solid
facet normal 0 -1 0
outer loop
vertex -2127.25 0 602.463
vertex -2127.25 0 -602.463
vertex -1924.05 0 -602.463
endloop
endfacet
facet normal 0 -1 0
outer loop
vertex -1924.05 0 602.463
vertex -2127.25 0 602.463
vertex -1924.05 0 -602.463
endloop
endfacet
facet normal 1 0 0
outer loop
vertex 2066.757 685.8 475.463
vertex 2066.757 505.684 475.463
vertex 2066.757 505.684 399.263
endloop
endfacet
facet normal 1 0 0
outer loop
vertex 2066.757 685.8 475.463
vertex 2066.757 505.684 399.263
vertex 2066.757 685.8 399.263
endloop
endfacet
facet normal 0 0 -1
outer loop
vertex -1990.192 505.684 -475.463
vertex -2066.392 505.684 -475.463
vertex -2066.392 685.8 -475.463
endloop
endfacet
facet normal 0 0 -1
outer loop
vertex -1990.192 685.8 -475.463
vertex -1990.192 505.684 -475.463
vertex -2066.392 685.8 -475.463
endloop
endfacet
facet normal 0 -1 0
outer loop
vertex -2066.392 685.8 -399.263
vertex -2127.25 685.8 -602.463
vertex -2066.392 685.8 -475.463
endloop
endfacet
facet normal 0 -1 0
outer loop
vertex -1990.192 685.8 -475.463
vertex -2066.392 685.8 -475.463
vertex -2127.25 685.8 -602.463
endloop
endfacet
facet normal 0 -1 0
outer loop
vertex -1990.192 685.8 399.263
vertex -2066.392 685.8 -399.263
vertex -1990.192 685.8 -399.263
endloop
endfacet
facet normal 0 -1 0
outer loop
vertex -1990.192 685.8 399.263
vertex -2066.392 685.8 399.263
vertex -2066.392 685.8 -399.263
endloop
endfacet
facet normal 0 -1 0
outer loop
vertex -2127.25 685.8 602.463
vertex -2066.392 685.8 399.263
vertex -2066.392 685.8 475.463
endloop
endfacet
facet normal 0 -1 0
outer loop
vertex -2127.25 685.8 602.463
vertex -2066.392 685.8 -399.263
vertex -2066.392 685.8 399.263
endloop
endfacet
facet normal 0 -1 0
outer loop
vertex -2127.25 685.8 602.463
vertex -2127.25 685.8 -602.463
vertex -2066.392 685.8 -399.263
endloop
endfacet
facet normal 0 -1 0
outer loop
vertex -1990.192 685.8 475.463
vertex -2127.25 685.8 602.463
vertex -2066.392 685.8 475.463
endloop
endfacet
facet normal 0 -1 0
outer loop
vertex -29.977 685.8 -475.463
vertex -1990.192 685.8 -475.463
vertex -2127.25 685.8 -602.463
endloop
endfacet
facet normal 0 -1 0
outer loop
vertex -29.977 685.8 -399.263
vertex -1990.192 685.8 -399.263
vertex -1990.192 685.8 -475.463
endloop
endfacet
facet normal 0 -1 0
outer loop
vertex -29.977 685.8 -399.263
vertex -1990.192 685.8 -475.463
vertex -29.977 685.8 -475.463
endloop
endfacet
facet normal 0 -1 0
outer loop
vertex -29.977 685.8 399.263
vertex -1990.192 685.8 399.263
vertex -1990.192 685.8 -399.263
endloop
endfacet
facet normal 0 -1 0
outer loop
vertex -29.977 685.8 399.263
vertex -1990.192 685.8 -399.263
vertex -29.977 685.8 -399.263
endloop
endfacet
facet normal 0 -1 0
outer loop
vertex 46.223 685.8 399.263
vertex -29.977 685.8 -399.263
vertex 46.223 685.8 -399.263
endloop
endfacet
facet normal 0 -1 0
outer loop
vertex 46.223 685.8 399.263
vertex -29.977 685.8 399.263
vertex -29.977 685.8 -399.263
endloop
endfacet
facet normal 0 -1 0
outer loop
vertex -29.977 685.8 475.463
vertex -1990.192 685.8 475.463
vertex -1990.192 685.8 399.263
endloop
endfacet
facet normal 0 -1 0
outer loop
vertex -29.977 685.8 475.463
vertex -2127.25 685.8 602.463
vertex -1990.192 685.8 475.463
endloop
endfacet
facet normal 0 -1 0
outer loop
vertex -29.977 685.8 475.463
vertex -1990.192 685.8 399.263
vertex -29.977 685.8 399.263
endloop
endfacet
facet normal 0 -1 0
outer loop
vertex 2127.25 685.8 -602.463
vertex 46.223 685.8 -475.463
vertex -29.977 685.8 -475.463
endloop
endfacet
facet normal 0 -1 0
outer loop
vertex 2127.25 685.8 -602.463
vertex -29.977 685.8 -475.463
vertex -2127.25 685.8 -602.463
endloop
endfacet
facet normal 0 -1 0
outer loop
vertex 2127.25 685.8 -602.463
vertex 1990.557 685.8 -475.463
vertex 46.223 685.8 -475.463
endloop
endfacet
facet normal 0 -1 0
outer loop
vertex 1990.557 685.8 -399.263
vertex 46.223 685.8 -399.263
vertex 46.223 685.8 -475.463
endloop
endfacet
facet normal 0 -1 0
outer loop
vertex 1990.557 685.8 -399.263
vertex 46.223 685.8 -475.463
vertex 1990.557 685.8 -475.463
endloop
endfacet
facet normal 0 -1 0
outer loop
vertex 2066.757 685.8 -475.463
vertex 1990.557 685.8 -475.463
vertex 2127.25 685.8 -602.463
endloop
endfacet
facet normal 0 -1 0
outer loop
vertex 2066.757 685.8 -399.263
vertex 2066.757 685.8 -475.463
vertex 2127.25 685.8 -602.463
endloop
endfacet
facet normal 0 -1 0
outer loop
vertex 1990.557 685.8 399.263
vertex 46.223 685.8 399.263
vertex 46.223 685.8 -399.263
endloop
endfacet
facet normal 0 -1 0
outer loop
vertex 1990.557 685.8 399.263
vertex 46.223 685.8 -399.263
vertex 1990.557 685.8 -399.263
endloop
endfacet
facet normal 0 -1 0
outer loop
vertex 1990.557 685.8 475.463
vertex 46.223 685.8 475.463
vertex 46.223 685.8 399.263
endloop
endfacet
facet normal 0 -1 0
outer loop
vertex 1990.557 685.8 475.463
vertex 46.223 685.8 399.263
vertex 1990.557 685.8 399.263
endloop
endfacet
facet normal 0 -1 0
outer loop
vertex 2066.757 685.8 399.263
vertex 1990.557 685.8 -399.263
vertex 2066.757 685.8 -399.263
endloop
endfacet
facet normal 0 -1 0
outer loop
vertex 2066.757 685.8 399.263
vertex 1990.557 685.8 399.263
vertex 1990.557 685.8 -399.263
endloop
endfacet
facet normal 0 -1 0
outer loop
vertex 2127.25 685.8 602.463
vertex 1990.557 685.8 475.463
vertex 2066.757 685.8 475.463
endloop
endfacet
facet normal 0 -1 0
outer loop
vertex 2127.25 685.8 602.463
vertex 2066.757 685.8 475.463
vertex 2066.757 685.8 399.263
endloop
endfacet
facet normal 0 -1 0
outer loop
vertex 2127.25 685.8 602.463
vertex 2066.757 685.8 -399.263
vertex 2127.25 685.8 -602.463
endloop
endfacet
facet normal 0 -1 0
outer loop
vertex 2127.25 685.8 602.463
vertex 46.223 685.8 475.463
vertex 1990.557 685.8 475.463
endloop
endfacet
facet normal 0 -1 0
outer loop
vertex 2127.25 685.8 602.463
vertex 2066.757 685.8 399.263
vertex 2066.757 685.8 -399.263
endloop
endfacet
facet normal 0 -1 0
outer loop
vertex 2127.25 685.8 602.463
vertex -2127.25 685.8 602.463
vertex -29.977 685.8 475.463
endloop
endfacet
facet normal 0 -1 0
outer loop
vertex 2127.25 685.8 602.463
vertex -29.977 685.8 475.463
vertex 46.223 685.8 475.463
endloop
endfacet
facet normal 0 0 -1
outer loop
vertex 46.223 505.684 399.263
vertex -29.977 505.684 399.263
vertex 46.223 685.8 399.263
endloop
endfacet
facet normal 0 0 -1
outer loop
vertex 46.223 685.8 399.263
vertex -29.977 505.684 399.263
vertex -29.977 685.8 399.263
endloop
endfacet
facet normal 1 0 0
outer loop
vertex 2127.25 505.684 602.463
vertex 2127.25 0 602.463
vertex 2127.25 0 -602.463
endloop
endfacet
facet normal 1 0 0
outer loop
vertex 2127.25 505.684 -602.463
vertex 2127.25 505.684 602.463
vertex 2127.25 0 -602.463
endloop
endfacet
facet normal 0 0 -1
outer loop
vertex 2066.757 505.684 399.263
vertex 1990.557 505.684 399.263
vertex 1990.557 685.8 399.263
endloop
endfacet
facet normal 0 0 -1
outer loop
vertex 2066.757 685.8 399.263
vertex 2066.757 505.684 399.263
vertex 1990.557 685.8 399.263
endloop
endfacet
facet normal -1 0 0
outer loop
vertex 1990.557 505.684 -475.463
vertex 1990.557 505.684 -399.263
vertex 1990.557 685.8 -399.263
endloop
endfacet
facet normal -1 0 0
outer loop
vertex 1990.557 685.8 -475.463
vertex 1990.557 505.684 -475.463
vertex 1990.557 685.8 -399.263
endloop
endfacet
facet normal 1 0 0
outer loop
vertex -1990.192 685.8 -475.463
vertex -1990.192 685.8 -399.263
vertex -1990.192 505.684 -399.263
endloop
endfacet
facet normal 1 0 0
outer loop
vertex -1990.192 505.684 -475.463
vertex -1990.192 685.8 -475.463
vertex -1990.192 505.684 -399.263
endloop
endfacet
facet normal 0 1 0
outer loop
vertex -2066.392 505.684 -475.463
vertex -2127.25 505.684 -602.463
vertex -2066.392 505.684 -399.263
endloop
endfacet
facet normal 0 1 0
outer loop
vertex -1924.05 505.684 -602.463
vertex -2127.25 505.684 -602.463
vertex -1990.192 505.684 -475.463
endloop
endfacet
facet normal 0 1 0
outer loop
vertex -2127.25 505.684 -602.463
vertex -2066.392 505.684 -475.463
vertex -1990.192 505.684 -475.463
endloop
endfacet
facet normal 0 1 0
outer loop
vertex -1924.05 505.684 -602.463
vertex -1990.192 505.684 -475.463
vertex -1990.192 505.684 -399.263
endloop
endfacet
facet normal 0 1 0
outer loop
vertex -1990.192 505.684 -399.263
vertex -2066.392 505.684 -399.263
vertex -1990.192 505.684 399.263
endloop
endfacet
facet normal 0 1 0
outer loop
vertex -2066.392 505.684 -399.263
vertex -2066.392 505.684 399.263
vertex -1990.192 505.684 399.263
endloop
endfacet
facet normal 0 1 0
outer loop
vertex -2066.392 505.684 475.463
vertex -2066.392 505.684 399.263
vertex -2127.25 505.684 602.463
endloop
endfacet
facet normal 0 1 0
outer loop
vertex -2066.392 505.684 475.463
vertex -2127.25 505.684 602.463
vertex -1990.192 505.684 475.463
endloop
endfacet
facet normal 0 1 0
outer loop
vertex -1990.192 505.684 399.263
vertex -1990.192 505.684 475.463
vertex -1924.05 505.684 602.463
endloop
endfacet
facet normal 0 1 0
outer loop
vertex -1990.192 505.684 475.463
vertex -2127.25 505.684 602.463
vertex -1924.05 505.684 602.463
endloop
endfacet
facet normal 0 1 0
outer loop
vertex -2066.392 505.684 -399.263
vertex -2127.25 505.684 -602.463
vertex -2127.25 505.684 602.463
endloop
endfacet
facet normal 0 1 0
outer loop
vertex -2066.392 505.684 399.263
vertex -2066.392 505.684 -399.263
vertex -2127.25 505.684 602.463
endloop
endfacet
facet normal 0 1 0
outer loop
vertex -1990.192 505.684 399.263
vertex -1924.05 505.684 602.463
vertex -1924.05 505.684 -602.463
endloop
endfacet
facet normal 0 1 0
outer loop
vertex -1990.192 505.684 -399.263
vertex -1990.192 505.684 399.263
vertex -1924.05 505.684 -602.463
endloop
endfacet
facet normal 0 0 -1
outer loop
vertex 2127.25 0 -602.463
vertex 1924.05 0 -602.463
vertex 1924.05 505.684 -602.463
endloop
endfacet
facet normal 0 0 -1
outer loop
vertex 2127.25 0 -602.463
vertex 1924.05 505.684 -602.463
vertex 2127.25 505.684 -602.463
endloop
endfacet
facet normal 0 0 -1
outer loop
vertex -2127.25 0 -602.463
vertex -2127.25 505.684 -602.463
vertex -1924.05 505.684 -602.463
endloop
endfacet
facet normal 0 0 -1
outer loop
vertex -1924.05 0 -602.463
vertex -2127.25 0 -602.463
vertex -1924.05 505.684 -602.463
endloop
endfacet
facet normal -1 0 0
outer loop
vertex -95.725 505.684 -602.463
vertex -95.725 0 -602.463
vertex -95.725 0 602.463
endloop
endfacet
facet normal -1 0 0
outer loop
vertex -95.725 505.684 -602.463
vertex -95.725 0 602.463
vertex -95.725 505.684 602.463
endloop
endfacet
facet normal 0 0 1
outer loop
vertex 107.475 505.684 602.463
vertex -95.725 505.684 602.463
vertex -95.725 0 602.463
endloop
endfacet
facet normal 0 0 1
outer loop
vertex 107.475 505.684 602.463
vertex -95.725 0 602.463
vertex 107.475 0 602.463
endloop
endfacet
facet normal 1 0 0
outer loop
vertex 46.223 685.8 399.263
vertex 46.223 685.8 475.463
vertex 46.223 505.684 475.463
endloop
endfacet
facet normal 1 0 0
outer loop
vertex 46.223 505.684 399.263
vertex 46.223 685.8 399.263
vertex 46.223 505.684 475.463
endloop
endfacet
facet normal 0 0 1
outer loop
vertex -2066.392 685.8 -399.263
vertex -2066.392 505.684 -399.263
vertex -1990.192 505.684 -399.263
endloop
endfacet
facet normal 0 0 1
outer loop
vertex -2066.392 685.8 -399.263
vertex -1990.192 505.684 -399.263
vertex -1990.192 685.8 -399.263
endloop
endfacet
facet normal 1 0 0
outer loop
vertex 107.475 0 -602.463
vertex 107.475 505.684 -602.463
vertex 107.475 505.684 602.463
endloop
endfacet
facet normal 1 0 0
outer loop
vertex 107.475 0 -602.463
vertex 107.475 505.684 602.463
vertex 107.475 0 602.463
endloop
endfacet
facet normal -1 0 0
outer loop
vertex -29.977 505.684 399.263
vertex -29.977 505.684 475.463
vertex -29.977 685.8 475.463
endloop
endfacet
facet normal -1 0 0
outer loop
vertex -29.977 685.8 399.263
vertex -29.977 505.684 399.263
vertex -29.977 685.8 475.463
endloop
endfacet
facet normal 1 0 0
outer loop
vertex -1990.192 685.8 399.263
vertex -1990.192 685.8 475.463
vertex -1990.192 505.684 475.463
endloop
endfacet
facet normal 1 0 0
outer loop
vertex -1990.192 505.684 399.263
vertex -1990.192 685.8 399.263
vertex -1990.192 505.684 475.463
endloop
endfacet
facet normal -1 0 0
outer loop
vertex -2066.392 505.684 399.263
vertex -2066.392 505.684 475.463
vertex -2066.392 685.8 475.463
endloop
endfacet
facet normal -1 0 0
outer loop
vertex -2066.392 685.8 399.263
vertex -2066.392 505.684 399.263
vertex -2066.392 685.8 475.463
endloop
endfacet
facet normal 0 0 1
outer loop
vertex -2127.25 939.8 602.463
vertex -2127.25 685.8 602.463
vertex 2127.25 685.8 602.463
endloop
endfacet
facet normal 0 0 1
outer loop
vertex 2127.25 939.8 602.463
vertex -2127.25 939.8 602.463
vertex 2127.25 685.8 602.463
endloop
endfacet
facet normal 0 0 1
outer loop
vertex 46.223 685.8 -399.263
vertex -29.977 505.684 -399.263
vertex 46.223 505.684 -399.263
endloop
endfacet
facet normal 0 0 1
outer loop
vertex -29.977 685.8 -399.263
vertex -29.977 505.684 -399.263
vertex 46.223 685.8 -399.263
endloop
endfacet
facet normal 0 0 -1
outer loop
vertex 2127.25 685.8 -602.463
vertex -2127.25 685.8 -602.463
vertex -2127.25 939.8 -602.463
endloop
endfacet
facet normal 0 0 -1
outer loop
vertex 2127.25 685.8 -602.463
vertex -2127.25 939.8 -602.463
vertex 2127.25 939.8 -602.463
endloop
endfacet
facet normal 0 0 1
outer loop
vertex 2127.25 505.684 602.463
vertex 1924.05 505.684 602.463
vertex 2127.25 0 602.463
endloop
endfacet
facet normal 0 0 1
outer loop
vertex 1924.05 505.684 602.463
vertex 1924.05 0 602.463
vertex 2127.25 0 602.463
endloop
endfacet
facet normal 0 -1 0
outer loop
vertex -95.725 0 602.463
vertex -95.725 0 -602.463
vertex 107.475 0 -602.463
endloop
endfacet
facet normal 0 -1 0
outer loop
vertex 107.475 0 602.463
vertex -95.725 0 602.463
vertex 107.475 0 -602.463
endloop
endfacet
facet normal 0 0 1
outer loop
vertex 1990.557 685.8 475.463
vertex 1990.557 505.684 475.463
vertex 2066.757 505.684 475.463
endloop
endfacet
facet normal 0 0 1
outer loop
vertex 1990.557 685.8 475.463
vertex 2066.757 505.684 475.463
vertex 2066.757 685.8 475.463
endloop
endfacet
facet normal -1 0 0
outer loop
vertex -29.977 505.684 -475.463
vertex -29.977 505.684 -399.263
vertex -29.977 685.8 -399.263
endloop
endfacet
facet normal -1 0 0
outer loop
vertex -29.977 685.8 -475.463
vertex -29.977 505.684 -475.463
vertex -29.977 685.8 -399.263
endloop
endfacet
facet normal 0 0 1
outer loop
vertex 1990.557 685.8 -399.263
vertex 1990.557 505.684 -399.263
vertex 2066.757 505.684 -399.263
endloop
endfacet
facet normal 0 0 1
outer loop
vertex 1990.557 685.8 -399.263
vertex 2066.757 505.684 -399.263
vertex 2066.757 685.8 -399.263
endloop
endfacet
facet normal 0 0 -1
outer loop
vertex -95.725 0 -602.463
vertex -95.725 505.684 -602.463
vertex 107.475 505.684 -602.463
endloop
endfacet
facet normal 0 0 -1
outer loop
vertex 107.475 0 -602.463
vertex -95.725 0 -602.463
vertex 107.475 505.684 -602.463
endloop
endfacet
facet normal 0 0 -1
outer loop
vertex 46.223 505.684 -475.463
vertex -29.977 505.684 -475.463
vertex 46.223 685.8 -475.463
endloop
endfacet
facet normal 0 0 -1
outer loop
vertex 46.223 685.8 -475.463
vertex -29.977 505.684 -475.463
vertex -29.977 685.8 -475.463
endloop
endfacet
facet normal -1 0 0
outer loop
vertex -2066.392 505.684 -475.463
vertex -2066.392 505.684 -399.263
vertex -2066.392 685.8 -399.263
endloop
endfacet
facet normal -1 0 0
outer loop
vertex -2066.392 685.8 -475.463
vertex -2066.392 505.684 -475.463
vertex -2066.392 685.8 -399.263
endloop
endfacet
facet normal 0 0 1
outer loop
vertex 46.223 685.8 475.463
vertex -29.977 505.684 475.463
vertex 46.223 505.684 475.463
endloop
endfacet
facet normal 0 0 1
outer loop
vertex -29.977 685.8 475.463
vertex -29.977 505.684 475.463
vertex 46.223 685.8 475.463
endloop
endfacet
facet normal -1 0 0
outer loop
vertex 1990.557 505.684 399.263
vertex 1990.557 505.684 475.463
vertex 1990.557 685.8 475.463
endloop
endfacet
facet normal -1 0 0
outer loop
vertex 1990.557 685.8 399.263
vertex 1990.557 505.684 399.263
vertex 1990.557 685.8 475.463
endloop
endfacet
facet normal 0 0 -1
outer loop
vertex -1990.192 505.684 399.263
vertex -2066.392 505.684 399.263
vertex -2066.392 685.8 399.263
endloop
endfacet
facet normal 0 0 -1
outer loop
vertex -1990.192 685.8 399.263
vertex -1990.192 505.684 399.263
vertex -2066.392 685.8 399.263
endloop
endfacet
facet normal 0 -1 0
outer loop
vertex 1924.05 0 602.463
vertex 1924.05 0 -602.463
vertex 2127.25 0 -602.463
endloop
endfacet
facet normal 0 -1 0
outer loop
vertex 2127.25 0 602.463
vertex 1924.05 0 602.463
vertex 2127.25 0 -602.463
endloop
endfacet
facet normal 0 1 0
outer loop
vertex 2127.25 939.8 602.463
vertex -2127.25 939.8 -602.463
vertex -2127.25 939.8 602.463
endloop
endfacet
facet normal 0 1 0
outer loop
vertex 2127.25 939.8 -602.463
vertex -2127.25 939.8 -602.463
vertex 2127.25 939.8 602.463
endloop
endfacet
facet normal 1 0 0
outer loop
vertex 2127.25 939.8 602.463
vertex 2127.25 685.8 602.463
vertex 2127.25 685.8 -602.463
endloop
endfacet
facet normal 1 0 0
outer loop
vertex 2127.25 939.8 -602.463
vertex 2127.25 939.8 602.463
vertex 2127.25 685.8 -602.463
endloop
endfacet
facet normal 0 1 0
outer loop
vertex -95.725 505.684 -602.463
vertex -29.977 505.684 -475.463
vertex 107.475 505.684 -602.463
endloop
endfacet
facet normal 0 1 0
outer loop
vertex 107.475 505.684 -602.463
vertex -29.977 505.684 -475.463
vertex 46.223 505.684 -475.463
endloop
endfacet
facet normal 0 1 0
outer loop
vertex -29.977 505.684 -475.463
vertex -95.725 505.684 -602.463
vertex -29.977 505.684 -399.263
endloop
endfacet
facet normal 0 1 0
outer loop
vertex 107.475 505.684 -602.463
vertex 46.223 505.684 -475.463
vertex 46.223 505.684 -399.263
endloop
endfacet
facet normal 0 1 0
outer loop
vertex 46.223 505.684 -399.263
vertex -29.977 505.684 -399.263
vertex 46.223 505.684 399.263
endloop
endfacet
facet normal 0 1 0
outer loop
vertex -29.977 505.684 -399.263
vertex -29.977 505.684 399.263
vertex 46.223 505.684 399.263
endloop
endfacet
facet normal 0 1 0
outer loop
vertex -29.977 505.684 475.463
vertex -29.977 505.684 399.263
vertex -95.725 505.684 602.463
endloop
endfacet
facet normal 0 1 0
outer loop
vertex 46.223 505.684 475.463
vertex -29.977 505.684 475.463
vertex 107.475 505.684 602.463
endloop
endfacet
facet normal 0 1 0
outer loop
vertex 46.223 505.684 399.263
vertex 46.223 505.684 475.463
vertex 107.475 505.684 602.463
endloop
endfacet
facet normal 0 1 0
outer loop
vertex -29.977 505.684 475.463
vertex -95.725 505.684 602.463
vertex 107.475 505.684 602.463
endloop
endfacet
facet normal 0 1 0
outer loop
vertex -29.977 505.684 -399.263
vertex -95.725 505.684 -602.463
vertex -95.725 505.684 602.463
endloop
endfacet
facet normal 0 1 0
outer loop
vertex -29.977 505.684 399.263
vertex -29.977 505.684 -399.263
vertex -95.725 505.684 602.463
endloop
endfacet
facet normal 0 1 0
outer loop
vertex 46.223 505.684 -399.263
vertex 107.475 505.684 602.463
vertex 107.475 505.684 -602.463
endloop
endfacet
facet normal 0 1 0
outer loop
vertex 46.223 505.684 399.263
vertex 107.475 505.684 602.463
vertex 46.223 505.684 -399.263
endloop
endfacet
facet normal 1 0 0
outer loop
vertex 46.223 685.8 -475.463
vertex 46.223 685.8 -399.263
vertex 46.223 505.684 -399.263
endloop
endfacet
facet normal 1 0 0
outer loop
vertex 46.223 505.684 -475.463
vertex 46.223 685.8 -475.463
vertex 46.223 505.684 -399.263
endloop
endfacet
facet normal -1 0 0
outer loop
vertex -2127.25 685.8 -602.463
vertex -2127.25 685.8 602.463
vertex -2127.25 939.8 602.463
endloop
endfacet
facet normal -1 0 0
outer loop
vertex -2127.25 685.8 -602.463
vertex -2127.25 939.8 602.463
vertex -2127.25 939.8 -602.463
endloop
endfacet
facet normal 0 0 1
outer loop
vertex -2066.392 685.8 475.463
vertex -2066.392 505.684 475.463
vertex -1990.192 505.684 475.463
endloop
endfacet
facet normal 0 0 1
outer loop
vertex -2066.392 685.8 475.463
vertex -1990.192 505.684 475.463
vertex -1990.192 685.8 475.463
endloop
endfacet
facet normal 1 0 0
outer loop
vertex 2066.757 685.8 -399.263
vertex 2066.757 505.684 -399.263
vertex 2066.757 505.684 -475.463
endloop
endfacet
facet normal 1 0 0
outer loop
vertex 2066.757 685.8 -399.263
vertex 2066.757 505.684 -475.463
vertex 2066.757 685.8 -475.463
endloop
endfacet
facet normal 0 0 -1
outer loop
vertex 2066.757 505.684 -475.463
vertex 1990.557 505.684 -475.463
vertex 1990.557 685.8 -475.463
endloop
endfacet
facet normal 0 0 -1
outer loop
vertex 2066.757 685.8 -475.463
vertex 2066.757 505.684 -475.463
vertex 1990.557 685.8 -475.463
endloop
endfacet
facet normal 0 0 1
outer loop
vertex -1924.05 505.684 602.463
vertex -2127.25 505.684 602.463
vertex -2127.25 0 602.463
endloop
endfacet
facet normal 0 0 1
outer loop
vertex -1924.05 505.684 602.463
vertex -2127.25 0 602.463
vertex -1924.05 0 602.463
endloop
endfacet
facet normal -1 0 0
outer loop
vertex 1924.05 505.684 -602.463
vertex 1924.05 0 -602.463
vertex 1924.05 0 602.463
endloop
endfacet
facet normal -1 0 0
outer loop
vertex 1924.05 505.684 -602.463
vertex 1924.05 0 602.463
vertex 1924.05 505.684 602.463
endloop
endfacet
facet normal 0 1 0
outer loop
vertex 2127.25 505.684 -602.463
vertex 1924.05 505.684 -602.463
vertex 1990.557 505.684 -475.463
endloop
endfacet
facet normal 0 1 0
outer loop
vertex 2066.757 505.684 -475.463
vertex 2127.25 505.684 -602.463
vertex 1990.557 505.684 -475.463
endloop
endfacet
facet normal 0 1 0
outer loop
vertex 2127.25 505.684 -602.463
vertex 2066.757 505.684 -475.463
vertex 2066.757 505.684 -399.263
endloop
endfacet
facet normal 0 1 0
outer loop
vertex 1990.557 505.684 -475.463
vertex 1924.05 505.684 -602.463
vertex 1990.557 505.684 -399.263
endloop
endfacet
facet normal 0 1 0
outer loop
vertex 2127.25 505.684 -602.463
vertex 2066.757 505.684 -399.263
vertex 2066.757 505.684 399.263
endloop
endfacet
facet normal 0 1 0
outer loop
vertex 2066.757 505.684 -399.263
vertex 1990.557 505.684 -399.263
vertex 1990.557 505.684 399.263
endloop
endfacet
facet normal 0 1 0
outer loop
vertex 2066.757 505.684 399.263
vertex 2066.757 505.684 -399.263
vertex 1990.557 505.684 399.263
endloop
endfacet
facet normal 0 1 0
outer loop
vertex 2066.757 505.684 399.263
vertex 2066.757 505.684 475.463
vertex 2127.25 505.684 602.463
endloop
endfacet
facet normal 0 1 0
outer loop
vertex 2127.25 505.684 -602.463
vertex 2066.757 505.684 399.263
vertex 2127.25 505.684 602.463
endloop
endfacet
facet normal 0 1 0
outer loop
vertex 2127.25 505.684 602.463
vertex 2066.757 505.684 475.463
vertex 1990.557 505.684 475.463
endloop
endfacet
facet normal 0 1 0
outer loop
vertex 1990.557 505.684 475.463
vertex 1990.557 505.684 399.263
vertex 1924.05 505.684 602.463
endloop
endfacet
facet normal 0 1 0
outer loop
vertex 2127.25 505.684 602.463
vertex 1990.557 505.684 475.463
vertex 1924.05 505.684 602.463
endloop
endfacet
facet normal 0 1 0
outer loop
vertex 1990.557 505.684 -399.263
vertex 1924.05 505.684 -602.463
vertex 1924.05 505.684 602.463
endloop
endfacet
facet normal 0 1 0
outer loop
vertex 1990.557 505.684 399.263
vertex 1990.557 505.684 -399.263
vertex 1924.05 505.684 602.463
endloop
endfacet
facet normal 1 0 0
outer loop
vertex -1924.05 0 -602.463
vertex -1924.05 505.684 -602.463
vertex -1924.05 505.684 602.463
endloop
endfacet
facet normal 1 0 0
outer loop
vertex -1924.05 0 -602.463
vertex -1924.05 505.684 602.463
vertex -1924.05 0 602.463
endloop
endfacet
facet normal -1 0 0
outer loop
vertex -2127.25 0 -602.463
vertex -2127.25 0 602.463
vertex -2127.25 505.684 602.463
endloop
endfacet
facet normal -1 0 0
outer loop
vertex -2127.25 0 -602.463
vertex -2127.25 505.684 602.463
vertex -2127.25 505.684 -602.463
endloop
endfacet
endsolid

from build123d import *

# Parameters (mm, degrees)
SKETCH1_W           = 4254.5
SKETCH1_H           = 1204.9252
BOSS_EXTRUDE1_DEPTH = 939.8
SKETCH2_W           = 60.857687965
SKETCH2_H           = 180.116075376
SKETCH2_W_2         = 60.49310688
CUT_EXTRUDE1_DEPTH  = 1205.9252
SKETCH3_W           = 127
SKETCH3_H           = 180.116075376
SKETCH3_W_2         = 798.5252
CUT_EXTRUDE2_DEPTH  = 4255.5


with BuildPart() as part:
    # Sketch1 → Boss-Extrude1 (new body)
    with BuildSketch(Plane(origin=(0, 0, 0), x_dir=(1, 0, 0), z_dir=(0, 1, 0))):
        Rectangle(SKETCH1_W, SKETCH1_H)
    extrude(amount=BOSS_EXTRUDE1_DEPTH)

    # Sketch2 → Cut-Extrude1 (cut, through all)
    with BuildSketch(Plane.XY.offset(602.4626)):
        with Locations((-2096.821156018, 595.741962312)):
            Rectangle(SKETCH2_W, SKETCH2_H)
        Polygon((-29.977483529, 685.8), (-1990.192312035, 685.8), (-1990.192312035, 505.683924624), (-1924.05, 505.683924624), (-1924.05, 0), (-95.72476265, 0), (-95.72476265, 505.683924624), (-29.977483529, 505.683924624), align=None)
        Polygon((1990.55689312, 685.8), (46.222516471, 685.8), (46.222516471, 505.683924624), (107.47523735, 505.683924624), (107.47523735, 0), (1924.05, 0), (1924.05, 505.683924624), (1990.55689312, 505.683924624), align=None)
        with Locations((2097.00344656, 595.741962312)):
            Rectangle(SKETCH2_W_2, SKETCH2_H)
    extrude(amount=-CUT_EXTRUDE1_DEPTH, mode=Mode.SUBTRACT)

    # Sketch3 → Cut-Extrude2 (cut, through all)
    with BuildSketch(Plane.ZY.offset(2127.25)):
        with Locations((-538.9626, 595.741962312)):
            Rectangle(SKETCH3_W, SKETCH3_H)
        with Locations((0, 595.741962312)):
            Rectangle(SKETCH3_W_2, SKETCH3_H)
        with Locations((538.9626, 595.741962312)):
            Rectangle(SKETCH3_W, SKETCH3_H)
    extrude(amount=-CUT_EXTRUDE2_DEPTH, mode=Mode.SUBTRACT)


solid = part.part
